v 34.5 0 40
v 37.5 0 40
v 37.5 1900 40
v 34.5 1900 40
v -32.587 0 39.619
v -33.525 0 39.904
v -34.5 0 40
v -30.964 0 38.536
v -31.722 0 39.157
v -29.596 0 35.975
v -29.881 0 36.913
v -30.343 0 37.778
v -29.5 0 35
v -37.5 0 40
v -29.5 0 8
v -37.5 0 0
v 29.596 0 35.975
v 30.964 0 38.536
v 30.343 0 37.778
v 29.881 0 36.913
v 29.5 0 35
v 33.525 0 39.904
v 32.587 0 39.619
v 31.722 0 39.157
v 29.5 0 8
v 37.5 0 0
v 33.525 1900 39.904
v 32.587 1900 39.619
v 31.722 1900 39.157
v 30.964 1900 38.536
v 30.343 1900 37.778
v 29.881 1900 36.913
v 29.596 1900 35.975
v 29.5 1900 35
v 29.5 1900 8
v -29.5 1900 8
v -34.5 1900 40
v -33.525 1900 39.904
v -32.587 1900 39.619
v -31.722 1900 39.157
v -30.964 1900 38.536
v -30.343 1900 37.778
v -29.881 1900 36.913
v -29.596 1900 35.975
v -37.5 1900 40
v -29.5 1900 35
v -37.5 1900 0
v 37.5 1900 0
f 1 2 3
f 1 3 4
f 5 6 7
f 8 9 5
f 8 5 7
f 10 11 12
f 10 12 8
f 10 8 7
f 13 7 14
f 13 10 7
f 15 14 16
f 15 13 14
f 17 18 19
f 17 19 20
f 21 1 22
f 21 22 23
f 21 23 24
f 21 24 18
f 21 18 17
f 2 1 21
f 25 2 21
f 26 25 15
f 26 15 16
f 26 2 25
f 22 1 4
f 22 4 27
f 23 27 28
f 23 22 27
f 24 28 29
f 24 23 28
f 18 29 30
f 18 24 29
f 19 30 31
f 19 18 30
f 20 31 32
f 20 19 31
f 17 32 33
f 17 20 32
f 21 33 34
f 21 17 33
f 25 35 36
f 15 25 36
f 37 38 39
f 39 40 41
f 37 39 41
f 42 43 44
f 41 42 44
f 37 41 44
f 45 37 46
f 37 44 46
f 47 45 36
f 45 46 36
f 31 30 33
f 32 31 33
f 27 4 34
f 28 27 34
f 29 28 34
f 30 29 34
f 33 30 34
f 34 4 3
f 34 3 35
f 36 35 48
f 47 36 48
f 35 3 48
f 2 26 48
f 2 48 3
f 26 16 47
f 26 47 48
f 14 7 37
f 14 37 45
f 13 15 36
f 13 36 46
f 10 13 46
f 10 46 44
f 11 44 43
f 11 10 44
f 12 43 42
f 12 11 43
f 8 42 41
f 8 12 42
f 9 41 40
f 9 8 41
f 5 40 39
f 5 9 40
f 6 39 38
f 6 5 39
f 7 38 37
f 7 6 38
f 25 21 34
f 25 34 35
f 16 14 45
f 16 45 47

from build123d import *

# Parameters (mm, degrees)
C_CHANNEL_80_X_8_1_DEPTH = 1900


with BuildPart() as part:
    # Sketch11 → C channel 80 X 8(1) (new body)
    with BuildSketch(Plane.ZX):
        with BuildLine():
            Line((0, -37.5), (0, 37.5))
            Line((0, 37.5), (40, 37.5))
            Line((40, 37.5), (40, 34.5))
            ThreePointArc((40, 34.5), (38.535533906, 30.964466094), (35, 29.5))
            Line((35, 29.5), (8, 29.5))
            Line((8, 29.5), (8, -29.5))
            Line((8, -29.5), (35, -29.5))
            ThreePointArc((35, -29.5), (38.535533906, -30.964466094), (40, -34.5))
            Line((40, -34.5), (40, -37.5))
            Line((40, -37.5), (0, -37.5))
        make_face()
    extrude(amount=C_CHANNEL_80_X_8_1_DEPTH)


solid = part.part
